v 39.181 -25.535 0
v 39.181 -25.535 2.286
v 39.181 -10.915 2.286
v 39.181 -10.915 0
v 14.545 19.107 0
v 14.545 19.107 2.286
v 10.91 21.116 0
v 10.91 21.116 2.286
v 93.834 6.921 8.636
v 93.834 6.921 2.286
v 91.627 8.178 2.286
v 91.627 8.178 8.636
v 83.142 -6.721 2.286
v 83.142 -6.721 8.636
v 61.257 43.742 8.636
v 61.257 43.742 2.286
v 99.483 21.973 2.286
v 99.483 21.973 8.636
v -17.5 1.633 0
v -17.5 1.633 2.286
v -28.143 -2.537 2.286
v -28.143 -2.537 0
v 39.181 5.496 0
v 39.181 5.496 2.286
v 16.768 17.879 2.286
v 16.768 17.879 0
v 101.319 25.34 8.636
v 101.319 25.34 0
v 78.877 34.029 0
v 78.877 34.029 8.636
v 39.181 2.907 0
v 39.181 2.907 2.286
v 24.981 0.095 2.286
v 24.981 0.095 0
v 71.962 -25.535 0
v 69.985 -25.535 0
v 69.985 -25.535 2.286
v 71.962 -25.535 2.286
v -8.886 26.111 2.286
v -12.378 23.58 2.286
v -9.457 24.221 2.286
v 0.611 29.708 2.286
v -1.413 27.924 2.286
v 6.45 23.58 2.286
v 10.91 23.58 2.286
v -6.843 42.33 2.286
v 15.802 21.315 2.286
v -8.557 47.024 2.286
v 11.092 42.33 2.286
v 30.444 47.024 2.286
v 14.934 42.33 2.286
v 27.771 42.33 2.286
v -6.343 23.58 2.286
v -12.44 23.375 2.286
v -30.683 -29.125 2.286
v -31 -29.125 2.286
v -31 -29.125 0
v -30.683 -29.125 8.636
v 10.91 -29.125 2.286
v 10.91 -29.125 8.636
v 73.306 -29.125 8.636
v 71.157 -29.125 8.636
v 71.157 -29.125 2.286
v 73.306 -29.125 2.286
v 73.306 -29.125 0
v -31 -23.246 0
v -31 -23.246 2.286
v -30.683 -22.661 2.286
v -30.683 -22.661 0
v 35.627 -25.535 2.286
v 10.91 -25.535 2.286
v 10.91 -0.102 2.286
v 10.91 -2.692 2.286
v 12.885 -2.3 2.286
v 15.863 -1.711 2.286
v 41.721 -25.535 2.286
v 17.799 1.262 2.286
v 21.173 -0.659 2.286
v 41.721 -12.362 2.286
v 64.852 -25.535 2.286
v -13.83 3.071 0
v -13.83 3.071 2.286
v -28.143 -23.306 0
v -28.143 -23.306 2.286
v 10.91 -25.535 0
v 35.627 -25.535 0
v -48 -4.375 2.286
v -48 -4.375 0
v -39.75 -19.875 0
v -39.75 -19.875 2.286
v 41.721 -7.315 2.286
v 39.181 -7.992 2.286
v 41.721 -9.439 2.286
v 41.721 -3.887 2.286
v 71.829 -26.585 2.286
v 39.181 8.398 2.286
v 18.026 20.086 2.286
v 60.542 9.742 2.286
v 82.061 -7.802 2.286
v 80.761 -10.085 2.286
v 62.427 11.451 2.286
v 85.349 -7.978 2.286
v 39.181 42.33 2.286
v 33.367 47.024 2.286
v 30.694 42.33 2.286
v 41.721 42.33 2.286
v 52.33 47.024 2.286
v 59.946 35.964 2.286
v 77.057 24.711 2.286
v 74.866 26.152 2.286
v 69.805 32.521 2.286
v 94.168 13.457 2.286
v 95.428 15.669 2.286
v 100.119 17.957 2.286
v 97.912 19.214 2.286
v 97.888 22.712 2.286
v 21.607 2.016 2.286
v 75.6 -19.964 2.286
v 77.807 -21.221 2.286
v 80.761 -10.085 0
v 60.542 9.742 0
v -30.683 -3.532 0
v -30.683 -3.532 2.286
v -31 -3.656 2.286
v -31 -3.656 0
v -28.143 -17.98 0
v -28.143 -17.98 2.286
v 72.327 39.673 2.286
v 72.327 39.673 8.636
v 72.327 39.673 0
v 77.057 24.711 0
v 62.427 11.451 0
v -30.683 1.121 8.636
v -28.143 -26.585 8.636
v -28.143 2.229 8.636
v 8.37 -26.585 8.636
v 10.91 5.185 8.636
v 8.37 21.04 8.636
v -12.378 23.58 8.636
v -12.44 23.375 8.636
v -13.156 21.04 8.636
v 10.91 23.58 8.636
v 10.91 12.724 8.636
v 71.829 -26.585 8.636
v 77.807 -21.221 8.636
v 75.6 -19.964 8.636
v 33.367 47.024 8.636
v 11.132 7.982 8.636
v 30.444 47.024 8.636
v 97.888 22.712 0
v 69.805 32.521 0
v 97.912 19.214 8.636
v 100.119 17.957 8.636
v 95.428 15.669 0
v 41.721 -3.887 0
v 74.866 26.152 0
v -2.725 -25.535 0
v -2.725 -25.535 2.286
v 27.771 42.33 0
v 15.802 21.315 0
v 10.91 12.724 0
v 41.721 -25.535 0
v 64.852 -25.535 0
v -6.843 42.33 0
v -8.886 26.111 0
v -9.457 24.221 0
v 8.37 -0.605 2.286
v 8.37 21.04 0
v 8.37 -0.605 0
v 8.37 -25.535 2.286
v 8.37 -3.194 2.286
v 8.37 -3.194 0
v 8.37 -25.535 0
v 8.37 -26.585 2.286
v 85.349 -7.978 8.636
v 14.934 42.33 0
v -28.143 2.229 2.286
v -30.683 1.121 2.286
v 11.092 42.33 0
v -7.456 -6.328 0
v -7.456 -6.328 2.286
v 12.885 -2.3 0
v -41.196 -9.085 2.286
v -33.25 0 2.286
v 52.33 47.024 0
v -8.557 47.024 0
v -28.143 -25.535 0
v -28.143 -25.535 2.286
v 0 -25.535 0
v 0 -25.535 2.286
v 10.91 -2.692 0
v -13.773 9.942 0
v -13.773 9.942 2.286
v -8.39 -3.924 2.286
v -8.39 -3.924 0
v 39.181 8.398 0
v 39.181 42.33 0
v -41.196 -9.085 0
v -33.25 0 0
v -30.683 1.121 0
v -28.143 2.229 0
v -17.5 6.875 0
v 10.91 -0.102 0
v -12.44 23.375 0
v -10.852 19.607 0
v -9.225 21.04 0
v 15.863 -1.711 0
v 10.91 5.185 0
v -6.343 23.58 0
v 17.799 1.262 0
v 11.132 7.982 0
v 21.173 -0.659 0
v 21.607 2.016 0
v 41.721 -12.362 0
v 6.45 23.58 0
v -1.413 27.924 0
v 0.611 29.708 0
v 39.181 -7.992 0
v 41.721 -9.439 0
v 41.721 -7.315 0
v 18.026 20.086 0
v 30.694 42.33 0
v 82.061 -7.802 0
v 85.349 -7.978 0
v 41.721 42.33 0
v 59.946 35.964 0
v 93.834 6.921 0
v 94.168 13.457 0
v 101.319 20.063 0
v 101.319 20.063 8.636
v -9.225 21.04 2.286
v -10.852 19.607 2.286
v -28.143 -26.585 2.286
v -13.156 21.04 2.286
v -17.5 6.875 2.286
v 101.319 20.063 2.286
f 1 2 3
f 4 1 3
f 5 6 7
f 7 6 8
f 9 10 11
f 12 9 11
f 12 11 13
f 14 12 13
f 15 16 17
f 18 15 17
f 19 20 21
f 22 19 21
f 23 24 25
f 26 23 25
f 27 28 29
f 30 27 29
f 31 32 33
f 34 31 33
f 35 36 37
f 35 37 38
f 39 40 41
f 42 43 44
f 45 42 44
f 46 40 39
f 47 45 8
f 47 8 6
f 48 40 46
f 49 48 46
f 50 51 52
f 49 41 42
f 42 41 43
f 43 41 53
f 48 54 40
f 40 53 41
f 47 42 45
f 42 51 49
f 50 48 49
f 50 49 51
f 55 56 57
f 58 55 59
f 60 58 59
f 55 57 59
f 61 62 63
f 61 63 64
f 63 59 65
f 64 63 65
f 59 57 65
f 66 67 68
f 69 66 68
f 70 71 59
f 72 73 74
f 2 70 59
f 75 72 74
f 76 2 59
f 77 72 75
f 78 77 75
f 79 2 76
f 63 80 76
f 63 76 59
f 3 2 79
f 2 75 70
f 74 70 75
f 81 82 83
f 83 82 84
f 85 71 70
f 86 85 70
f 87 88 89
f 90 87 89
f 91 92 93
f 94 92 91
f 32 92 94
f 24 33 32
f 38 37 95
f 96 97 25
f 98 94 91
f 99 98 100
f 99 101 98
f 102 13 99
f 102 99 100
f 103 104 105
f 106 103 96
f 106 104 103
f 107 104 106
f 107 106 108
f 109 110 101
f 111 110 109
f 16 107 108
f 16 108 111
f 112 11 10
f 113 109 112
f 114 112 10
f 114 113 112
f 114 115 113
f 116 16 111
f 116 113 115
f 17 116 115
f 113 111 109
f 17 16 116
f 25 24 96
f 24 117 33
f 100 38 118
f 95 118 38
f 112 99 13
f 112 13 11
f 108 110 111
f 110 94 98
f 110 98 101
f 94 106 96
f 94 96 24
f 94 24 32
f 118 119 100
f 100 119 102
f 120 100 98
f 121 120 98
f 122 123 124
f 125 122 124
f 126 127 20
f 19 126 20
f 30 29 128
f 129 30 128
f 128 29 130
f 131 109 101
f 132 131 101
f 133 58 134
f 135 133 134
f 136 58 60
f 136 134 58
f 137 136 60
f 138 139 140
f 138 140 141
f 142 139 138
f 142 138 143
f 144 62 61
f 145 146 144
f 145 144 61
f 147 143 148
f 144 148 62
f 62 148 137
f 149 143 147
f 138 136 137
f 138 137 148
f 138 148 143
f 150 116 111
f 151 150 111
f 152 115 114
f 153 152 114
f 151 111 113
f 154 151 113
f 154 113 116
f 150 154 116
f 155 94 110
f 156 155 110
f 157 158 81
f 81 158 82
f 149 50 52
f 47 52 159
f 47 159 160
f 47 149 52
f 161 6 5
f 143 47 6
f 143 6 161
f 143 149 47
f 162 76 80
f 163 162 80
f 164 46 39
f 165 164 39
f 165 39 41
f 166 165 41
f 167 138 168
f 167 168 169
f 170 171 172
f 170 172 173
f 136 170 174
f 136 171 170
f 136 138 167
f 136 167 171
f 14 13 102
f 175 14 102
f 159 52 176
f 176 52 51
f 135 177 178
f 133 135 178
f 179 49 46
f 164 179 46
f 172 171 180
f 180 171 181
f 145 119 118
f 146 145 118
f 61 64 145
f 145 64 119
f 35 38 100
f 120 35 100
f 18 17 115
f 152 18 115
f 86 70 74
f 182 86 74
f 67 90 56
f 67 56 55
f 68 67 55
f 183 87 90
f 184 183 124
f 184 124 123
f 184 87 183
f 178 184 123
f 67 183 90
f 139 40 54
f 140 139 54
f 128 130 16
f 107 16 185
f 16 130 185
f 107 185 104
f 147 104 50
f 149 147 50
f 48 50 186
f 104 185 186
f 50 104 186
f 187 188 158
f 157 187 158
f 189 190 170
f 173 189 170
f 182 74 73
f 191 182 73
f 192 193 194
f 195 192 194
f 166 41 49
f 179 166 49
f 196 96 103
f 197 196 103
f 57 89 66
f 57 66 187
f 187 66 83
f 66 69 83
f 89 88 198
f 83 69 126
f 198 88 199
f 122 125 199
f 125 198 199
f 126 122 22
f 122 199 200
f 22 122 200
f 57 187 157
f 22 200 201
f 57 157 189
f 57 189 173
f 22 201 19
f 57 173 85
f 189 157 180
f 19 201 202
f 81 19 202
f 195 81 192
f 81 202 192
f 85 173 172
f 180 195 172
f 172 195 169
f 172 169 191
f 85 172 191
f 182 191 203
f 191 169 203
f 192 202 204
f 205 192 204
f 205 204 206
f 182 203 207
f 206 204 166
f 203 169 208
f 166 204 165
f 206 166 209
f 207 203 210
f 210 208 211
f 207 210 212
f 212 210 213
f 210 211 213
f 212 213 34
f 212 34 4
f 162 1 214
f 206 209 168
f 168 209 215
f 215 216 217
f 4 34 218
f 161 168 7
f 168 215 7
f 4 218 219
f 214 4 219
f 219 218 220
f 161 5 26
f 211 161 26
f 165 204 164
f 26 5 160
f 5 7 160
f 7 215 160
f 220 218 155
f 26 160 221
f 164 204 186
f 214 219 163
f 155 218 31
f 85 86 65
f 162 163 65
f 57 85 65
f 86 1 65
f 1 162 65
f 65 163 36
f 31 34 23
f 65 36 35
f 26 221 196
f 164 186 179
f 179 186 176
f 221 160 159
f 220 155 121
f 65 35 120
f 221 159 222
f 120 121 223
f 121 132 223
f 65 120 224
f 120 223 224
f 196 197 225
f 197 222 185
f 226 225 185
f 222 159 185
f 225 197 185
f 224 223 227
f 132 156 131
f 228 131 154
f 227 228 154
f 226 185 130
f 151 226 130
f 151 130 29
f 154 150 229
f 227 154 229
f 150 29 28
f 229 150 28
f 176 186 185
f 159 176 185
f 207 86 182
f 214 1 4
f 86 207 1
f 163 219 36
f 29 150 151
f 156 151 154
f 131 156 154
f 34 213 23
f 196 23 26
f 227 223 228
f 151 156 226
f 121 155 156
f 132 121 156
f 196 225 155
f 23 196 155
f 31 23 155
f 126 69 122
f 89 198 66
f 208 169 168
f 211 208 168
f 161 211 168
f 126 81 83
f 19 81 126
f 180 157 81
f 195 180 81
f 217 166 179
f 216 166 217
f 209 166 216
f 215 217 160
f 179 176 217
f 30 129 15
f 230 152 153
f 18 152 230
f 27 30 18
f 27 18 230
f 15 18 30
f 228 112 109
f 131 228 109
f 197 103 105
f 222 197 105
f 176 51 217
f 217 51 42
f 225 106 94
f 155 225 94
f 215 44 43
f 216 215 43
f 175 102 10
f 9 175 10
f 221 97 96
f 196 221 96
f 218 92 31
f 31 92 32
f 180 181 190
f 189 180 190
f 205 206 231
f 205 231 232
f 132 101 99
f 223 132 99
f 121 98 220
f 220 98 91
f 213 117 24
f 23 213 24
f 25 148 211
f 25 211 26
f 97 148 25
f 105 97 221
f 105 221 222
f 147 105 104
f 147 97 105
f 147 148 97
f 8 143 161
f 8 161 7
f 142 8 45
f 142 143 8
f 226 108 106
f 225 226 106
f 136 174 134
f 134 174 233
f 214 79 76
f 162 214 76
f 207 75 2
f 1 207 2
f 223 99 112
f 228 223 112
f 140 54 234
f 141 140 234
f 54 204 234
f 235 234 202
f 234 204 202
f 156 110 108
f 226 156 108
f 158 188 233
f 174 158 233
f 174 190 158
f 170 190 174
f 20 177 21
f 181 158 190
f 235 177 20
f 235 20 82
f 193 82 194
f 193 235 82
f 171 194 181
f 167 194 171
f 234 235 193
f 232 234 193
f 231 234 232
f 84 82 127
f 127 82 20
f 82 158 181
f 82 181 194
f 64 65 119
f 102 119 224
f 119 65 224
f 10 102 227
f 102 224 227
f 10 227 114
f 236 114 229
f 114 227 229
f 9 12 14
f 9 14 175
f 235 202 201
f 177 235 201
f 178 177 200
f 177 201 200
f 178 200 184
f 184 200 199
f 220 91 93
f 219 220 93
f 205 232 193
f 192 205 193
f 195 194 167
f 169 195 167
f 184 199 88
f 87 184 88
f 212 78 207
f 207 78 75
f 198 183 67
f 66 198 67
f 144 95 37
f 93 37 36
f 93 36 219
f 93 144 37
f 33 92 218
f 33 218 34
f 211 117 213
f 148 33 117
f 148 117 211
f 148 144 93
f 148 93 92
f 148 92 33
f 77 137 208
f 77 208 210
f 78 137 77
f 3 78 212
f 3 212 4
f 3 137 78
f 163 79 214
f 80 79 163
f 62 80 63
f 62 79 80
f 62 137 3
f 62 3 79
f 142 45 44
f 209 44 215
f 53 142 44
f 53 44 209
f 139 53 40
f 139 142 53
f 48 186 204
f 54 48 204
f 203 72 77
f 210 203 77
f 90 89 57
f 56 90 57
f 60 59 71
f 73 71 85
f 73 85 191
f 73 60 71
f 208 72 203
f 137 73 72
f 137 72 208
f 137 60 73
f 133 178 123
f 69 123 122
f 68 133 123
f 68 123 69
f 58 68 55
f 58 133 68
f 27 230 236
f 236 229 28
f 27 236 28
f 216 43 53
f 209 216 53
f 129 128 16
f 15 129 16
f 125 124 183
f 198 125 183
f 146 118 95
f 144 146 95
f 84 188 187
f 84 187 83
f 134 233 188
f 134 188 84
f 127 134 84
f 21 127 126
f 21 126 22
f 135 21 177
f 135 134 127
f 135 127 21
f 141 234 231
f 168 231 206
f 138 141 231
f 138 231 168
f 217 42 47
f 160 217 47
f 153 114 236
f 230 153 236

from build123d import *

# Parameters (mm, degrees)
F1_DEPTH      = 2.286
F4_DEPTH      = 2.287
F5_DEPTH      = 6.35
F5_DEPTH_BACK = 2.286


# Not quite as in the source:
# - a feature names something its author has since deleted; it is built from what else it names


with BuildPart() as f1:
    # F0 (on Top) → F1 (new body)
    with BuildSketch(Plane.XY):
        Polygon((-39.7502322496, -19.8751161248), (-31.0001806734, -29.1251689516), (73.3058652154, -29.1251689516), (101.3186621261, 20.063493978), (101.3186621261, 25.3395497125), (78.8771229202, 34.0285638846), (72.3271246897, 39.6729167182), (52.3297434038, 47.023841916), (50.4247434038, 47.023841916), (21.8864718038, 47.023841916), (19.9814718038, 47.023841916), (-8.5567997962, 47.023841916), (-12.4402794499, 23.3751358177), (-17.5001015898, 6.8750406358), (-33.2501941145, 0), (-48.0002794499, -4.3750257881), align=None)
    extrude(amount=F1_DEPTH)

    # F3 (on face) → F4 (cut, through all)
    with BuildSketch(Plane.XY.offset(2.286)):
        Polygon((-1.4134727199, 27.9240615151), (-10.8518015695, 19.606512621), (-13.772583649, 9.942060765), (-8.389721466, -3.9236969292), (39.1813585612, 5.4958437045), align=None)
        Polygon((39.1813585612, 42.3302979083), (14.9339871262, 42.3302979083), (0.6105190133, 29.707708861), (39.1813585612, 8.3977252198), align=None)
        Polygon((59.9464575784, 35.9643820735), (41.7213585612, 42.3302979083), (41.7213585612, -3.8873157464), (74.8655756118, 26.1523920247), align=None)
        Polygon((94.1682944652, 13.4573999427), (77.0573760218, 24.7108910081), (62.4269453342, 11.4508444138), (82.0611413863, -7.8019792523), align=None)
        Polygon((97.8877921519, 22.7117055132), (69.8045753566, 32.5210017107), (95.4278561797, 15.6691089989), align=None)
        Polygon((60.5416469817, 9.7421357277), (41.7213585612, -7.3153184719), (41.7213585612, -25.5348474687), (71.9623257974, -25.5348474687), (80.7611698183, -10.0846454022), align=None)
        Polygon((39.1813585612, -25.5348474687), (39.1813585612, 2.906528429), (15.8625438549, -1.7108256973), align=None)
        Polygon((12.8853386979, -2.3003415321), (-7.4562708514, -6.3281798236), (0, -25.5348474687), (35.6271387151, -25.5348474687), align=None)
        Polygon((-2.7246861202, -25.5348474687), (-13.8299450744, 3.0712777777), (-29.3522901989, -25.5348474687), align=None)
        Polygon((-31.0001806734, -23.2460485454), (-17.5001015898, 1.6332432115), (-31.0001806734, -3.6563351177), (-41.1958687779, -9.0849860736), align=None)
        Polygon((11.0922382598, 42.3302979083), (-6.8430267274, 42.3302979083), (-8.8859712705, 26.1111650616), (-9.4571967621, 24.2210612772), align=None)
    extrude(amount=-F4_DEPTH, mode=Mode.SUBTRACT)

    # F2 (on face) → F5 (join, two sides)
    with BuildSketch(Plane.XY.offset(2.286)) as f5_sk:
        Polygon((75.6003040089, -19.9636537803), (71.829370857, -26.5851689516), (11.132148453, 7.9817182735), (33.3665214857, 47.023841916), (30.4435046989, 47.023841916), (10.9098193266, 12.7239514546), (10.9098193266, 23.5798310484), (-12.3775088144, 23.5798310484), (-12.4402794499, 23.3751358177), (-13.1564102749, 21.0398310484), (8.3698193266, 21.0398310484), (8.3698193266, -26.5851689516), (-28.1426806734, -26.5851689516), (-28.1426806734, 2.2294702333), (-30.6826806734, 1.1207400345), (-30.6826806734, -29.1251689516), (-28.1426806734, -29.1251689516), (8.3698193266, -29.1251689516), (10.9098193266, -29.1251689516), (10.9098193266, 5.1853172614), (71.1568181061, -29.1251689516), (73.3058652154, -29.1251689516), (77.8074757327, -21.2206314976), align=None)
        Polygon((91.6267699042, 8.177785698), (83.1421703125, -6.7206234376), (85.3493420363, -7.9776011549), (93.8339416279, 6.9208079807), align=None)
        Polygon((99.4828806371, 21.9726089716), (97.9116584905, 19.2136443169), (100.1188302143, 17.9566665996), (101.3186621261, 20.063493978), (101.3186621261, 25.3395497125), (78.8771229202, 34.0285638846), (72.3271246897, 39.6729167182), (61.2565125507, 43.7424116468), align=None)
    extrude(amount=F5_DEPTH)
    extrude(f5_sk.sketch, amount=-F5_DEPTH_BACK)


solid = f1.part
